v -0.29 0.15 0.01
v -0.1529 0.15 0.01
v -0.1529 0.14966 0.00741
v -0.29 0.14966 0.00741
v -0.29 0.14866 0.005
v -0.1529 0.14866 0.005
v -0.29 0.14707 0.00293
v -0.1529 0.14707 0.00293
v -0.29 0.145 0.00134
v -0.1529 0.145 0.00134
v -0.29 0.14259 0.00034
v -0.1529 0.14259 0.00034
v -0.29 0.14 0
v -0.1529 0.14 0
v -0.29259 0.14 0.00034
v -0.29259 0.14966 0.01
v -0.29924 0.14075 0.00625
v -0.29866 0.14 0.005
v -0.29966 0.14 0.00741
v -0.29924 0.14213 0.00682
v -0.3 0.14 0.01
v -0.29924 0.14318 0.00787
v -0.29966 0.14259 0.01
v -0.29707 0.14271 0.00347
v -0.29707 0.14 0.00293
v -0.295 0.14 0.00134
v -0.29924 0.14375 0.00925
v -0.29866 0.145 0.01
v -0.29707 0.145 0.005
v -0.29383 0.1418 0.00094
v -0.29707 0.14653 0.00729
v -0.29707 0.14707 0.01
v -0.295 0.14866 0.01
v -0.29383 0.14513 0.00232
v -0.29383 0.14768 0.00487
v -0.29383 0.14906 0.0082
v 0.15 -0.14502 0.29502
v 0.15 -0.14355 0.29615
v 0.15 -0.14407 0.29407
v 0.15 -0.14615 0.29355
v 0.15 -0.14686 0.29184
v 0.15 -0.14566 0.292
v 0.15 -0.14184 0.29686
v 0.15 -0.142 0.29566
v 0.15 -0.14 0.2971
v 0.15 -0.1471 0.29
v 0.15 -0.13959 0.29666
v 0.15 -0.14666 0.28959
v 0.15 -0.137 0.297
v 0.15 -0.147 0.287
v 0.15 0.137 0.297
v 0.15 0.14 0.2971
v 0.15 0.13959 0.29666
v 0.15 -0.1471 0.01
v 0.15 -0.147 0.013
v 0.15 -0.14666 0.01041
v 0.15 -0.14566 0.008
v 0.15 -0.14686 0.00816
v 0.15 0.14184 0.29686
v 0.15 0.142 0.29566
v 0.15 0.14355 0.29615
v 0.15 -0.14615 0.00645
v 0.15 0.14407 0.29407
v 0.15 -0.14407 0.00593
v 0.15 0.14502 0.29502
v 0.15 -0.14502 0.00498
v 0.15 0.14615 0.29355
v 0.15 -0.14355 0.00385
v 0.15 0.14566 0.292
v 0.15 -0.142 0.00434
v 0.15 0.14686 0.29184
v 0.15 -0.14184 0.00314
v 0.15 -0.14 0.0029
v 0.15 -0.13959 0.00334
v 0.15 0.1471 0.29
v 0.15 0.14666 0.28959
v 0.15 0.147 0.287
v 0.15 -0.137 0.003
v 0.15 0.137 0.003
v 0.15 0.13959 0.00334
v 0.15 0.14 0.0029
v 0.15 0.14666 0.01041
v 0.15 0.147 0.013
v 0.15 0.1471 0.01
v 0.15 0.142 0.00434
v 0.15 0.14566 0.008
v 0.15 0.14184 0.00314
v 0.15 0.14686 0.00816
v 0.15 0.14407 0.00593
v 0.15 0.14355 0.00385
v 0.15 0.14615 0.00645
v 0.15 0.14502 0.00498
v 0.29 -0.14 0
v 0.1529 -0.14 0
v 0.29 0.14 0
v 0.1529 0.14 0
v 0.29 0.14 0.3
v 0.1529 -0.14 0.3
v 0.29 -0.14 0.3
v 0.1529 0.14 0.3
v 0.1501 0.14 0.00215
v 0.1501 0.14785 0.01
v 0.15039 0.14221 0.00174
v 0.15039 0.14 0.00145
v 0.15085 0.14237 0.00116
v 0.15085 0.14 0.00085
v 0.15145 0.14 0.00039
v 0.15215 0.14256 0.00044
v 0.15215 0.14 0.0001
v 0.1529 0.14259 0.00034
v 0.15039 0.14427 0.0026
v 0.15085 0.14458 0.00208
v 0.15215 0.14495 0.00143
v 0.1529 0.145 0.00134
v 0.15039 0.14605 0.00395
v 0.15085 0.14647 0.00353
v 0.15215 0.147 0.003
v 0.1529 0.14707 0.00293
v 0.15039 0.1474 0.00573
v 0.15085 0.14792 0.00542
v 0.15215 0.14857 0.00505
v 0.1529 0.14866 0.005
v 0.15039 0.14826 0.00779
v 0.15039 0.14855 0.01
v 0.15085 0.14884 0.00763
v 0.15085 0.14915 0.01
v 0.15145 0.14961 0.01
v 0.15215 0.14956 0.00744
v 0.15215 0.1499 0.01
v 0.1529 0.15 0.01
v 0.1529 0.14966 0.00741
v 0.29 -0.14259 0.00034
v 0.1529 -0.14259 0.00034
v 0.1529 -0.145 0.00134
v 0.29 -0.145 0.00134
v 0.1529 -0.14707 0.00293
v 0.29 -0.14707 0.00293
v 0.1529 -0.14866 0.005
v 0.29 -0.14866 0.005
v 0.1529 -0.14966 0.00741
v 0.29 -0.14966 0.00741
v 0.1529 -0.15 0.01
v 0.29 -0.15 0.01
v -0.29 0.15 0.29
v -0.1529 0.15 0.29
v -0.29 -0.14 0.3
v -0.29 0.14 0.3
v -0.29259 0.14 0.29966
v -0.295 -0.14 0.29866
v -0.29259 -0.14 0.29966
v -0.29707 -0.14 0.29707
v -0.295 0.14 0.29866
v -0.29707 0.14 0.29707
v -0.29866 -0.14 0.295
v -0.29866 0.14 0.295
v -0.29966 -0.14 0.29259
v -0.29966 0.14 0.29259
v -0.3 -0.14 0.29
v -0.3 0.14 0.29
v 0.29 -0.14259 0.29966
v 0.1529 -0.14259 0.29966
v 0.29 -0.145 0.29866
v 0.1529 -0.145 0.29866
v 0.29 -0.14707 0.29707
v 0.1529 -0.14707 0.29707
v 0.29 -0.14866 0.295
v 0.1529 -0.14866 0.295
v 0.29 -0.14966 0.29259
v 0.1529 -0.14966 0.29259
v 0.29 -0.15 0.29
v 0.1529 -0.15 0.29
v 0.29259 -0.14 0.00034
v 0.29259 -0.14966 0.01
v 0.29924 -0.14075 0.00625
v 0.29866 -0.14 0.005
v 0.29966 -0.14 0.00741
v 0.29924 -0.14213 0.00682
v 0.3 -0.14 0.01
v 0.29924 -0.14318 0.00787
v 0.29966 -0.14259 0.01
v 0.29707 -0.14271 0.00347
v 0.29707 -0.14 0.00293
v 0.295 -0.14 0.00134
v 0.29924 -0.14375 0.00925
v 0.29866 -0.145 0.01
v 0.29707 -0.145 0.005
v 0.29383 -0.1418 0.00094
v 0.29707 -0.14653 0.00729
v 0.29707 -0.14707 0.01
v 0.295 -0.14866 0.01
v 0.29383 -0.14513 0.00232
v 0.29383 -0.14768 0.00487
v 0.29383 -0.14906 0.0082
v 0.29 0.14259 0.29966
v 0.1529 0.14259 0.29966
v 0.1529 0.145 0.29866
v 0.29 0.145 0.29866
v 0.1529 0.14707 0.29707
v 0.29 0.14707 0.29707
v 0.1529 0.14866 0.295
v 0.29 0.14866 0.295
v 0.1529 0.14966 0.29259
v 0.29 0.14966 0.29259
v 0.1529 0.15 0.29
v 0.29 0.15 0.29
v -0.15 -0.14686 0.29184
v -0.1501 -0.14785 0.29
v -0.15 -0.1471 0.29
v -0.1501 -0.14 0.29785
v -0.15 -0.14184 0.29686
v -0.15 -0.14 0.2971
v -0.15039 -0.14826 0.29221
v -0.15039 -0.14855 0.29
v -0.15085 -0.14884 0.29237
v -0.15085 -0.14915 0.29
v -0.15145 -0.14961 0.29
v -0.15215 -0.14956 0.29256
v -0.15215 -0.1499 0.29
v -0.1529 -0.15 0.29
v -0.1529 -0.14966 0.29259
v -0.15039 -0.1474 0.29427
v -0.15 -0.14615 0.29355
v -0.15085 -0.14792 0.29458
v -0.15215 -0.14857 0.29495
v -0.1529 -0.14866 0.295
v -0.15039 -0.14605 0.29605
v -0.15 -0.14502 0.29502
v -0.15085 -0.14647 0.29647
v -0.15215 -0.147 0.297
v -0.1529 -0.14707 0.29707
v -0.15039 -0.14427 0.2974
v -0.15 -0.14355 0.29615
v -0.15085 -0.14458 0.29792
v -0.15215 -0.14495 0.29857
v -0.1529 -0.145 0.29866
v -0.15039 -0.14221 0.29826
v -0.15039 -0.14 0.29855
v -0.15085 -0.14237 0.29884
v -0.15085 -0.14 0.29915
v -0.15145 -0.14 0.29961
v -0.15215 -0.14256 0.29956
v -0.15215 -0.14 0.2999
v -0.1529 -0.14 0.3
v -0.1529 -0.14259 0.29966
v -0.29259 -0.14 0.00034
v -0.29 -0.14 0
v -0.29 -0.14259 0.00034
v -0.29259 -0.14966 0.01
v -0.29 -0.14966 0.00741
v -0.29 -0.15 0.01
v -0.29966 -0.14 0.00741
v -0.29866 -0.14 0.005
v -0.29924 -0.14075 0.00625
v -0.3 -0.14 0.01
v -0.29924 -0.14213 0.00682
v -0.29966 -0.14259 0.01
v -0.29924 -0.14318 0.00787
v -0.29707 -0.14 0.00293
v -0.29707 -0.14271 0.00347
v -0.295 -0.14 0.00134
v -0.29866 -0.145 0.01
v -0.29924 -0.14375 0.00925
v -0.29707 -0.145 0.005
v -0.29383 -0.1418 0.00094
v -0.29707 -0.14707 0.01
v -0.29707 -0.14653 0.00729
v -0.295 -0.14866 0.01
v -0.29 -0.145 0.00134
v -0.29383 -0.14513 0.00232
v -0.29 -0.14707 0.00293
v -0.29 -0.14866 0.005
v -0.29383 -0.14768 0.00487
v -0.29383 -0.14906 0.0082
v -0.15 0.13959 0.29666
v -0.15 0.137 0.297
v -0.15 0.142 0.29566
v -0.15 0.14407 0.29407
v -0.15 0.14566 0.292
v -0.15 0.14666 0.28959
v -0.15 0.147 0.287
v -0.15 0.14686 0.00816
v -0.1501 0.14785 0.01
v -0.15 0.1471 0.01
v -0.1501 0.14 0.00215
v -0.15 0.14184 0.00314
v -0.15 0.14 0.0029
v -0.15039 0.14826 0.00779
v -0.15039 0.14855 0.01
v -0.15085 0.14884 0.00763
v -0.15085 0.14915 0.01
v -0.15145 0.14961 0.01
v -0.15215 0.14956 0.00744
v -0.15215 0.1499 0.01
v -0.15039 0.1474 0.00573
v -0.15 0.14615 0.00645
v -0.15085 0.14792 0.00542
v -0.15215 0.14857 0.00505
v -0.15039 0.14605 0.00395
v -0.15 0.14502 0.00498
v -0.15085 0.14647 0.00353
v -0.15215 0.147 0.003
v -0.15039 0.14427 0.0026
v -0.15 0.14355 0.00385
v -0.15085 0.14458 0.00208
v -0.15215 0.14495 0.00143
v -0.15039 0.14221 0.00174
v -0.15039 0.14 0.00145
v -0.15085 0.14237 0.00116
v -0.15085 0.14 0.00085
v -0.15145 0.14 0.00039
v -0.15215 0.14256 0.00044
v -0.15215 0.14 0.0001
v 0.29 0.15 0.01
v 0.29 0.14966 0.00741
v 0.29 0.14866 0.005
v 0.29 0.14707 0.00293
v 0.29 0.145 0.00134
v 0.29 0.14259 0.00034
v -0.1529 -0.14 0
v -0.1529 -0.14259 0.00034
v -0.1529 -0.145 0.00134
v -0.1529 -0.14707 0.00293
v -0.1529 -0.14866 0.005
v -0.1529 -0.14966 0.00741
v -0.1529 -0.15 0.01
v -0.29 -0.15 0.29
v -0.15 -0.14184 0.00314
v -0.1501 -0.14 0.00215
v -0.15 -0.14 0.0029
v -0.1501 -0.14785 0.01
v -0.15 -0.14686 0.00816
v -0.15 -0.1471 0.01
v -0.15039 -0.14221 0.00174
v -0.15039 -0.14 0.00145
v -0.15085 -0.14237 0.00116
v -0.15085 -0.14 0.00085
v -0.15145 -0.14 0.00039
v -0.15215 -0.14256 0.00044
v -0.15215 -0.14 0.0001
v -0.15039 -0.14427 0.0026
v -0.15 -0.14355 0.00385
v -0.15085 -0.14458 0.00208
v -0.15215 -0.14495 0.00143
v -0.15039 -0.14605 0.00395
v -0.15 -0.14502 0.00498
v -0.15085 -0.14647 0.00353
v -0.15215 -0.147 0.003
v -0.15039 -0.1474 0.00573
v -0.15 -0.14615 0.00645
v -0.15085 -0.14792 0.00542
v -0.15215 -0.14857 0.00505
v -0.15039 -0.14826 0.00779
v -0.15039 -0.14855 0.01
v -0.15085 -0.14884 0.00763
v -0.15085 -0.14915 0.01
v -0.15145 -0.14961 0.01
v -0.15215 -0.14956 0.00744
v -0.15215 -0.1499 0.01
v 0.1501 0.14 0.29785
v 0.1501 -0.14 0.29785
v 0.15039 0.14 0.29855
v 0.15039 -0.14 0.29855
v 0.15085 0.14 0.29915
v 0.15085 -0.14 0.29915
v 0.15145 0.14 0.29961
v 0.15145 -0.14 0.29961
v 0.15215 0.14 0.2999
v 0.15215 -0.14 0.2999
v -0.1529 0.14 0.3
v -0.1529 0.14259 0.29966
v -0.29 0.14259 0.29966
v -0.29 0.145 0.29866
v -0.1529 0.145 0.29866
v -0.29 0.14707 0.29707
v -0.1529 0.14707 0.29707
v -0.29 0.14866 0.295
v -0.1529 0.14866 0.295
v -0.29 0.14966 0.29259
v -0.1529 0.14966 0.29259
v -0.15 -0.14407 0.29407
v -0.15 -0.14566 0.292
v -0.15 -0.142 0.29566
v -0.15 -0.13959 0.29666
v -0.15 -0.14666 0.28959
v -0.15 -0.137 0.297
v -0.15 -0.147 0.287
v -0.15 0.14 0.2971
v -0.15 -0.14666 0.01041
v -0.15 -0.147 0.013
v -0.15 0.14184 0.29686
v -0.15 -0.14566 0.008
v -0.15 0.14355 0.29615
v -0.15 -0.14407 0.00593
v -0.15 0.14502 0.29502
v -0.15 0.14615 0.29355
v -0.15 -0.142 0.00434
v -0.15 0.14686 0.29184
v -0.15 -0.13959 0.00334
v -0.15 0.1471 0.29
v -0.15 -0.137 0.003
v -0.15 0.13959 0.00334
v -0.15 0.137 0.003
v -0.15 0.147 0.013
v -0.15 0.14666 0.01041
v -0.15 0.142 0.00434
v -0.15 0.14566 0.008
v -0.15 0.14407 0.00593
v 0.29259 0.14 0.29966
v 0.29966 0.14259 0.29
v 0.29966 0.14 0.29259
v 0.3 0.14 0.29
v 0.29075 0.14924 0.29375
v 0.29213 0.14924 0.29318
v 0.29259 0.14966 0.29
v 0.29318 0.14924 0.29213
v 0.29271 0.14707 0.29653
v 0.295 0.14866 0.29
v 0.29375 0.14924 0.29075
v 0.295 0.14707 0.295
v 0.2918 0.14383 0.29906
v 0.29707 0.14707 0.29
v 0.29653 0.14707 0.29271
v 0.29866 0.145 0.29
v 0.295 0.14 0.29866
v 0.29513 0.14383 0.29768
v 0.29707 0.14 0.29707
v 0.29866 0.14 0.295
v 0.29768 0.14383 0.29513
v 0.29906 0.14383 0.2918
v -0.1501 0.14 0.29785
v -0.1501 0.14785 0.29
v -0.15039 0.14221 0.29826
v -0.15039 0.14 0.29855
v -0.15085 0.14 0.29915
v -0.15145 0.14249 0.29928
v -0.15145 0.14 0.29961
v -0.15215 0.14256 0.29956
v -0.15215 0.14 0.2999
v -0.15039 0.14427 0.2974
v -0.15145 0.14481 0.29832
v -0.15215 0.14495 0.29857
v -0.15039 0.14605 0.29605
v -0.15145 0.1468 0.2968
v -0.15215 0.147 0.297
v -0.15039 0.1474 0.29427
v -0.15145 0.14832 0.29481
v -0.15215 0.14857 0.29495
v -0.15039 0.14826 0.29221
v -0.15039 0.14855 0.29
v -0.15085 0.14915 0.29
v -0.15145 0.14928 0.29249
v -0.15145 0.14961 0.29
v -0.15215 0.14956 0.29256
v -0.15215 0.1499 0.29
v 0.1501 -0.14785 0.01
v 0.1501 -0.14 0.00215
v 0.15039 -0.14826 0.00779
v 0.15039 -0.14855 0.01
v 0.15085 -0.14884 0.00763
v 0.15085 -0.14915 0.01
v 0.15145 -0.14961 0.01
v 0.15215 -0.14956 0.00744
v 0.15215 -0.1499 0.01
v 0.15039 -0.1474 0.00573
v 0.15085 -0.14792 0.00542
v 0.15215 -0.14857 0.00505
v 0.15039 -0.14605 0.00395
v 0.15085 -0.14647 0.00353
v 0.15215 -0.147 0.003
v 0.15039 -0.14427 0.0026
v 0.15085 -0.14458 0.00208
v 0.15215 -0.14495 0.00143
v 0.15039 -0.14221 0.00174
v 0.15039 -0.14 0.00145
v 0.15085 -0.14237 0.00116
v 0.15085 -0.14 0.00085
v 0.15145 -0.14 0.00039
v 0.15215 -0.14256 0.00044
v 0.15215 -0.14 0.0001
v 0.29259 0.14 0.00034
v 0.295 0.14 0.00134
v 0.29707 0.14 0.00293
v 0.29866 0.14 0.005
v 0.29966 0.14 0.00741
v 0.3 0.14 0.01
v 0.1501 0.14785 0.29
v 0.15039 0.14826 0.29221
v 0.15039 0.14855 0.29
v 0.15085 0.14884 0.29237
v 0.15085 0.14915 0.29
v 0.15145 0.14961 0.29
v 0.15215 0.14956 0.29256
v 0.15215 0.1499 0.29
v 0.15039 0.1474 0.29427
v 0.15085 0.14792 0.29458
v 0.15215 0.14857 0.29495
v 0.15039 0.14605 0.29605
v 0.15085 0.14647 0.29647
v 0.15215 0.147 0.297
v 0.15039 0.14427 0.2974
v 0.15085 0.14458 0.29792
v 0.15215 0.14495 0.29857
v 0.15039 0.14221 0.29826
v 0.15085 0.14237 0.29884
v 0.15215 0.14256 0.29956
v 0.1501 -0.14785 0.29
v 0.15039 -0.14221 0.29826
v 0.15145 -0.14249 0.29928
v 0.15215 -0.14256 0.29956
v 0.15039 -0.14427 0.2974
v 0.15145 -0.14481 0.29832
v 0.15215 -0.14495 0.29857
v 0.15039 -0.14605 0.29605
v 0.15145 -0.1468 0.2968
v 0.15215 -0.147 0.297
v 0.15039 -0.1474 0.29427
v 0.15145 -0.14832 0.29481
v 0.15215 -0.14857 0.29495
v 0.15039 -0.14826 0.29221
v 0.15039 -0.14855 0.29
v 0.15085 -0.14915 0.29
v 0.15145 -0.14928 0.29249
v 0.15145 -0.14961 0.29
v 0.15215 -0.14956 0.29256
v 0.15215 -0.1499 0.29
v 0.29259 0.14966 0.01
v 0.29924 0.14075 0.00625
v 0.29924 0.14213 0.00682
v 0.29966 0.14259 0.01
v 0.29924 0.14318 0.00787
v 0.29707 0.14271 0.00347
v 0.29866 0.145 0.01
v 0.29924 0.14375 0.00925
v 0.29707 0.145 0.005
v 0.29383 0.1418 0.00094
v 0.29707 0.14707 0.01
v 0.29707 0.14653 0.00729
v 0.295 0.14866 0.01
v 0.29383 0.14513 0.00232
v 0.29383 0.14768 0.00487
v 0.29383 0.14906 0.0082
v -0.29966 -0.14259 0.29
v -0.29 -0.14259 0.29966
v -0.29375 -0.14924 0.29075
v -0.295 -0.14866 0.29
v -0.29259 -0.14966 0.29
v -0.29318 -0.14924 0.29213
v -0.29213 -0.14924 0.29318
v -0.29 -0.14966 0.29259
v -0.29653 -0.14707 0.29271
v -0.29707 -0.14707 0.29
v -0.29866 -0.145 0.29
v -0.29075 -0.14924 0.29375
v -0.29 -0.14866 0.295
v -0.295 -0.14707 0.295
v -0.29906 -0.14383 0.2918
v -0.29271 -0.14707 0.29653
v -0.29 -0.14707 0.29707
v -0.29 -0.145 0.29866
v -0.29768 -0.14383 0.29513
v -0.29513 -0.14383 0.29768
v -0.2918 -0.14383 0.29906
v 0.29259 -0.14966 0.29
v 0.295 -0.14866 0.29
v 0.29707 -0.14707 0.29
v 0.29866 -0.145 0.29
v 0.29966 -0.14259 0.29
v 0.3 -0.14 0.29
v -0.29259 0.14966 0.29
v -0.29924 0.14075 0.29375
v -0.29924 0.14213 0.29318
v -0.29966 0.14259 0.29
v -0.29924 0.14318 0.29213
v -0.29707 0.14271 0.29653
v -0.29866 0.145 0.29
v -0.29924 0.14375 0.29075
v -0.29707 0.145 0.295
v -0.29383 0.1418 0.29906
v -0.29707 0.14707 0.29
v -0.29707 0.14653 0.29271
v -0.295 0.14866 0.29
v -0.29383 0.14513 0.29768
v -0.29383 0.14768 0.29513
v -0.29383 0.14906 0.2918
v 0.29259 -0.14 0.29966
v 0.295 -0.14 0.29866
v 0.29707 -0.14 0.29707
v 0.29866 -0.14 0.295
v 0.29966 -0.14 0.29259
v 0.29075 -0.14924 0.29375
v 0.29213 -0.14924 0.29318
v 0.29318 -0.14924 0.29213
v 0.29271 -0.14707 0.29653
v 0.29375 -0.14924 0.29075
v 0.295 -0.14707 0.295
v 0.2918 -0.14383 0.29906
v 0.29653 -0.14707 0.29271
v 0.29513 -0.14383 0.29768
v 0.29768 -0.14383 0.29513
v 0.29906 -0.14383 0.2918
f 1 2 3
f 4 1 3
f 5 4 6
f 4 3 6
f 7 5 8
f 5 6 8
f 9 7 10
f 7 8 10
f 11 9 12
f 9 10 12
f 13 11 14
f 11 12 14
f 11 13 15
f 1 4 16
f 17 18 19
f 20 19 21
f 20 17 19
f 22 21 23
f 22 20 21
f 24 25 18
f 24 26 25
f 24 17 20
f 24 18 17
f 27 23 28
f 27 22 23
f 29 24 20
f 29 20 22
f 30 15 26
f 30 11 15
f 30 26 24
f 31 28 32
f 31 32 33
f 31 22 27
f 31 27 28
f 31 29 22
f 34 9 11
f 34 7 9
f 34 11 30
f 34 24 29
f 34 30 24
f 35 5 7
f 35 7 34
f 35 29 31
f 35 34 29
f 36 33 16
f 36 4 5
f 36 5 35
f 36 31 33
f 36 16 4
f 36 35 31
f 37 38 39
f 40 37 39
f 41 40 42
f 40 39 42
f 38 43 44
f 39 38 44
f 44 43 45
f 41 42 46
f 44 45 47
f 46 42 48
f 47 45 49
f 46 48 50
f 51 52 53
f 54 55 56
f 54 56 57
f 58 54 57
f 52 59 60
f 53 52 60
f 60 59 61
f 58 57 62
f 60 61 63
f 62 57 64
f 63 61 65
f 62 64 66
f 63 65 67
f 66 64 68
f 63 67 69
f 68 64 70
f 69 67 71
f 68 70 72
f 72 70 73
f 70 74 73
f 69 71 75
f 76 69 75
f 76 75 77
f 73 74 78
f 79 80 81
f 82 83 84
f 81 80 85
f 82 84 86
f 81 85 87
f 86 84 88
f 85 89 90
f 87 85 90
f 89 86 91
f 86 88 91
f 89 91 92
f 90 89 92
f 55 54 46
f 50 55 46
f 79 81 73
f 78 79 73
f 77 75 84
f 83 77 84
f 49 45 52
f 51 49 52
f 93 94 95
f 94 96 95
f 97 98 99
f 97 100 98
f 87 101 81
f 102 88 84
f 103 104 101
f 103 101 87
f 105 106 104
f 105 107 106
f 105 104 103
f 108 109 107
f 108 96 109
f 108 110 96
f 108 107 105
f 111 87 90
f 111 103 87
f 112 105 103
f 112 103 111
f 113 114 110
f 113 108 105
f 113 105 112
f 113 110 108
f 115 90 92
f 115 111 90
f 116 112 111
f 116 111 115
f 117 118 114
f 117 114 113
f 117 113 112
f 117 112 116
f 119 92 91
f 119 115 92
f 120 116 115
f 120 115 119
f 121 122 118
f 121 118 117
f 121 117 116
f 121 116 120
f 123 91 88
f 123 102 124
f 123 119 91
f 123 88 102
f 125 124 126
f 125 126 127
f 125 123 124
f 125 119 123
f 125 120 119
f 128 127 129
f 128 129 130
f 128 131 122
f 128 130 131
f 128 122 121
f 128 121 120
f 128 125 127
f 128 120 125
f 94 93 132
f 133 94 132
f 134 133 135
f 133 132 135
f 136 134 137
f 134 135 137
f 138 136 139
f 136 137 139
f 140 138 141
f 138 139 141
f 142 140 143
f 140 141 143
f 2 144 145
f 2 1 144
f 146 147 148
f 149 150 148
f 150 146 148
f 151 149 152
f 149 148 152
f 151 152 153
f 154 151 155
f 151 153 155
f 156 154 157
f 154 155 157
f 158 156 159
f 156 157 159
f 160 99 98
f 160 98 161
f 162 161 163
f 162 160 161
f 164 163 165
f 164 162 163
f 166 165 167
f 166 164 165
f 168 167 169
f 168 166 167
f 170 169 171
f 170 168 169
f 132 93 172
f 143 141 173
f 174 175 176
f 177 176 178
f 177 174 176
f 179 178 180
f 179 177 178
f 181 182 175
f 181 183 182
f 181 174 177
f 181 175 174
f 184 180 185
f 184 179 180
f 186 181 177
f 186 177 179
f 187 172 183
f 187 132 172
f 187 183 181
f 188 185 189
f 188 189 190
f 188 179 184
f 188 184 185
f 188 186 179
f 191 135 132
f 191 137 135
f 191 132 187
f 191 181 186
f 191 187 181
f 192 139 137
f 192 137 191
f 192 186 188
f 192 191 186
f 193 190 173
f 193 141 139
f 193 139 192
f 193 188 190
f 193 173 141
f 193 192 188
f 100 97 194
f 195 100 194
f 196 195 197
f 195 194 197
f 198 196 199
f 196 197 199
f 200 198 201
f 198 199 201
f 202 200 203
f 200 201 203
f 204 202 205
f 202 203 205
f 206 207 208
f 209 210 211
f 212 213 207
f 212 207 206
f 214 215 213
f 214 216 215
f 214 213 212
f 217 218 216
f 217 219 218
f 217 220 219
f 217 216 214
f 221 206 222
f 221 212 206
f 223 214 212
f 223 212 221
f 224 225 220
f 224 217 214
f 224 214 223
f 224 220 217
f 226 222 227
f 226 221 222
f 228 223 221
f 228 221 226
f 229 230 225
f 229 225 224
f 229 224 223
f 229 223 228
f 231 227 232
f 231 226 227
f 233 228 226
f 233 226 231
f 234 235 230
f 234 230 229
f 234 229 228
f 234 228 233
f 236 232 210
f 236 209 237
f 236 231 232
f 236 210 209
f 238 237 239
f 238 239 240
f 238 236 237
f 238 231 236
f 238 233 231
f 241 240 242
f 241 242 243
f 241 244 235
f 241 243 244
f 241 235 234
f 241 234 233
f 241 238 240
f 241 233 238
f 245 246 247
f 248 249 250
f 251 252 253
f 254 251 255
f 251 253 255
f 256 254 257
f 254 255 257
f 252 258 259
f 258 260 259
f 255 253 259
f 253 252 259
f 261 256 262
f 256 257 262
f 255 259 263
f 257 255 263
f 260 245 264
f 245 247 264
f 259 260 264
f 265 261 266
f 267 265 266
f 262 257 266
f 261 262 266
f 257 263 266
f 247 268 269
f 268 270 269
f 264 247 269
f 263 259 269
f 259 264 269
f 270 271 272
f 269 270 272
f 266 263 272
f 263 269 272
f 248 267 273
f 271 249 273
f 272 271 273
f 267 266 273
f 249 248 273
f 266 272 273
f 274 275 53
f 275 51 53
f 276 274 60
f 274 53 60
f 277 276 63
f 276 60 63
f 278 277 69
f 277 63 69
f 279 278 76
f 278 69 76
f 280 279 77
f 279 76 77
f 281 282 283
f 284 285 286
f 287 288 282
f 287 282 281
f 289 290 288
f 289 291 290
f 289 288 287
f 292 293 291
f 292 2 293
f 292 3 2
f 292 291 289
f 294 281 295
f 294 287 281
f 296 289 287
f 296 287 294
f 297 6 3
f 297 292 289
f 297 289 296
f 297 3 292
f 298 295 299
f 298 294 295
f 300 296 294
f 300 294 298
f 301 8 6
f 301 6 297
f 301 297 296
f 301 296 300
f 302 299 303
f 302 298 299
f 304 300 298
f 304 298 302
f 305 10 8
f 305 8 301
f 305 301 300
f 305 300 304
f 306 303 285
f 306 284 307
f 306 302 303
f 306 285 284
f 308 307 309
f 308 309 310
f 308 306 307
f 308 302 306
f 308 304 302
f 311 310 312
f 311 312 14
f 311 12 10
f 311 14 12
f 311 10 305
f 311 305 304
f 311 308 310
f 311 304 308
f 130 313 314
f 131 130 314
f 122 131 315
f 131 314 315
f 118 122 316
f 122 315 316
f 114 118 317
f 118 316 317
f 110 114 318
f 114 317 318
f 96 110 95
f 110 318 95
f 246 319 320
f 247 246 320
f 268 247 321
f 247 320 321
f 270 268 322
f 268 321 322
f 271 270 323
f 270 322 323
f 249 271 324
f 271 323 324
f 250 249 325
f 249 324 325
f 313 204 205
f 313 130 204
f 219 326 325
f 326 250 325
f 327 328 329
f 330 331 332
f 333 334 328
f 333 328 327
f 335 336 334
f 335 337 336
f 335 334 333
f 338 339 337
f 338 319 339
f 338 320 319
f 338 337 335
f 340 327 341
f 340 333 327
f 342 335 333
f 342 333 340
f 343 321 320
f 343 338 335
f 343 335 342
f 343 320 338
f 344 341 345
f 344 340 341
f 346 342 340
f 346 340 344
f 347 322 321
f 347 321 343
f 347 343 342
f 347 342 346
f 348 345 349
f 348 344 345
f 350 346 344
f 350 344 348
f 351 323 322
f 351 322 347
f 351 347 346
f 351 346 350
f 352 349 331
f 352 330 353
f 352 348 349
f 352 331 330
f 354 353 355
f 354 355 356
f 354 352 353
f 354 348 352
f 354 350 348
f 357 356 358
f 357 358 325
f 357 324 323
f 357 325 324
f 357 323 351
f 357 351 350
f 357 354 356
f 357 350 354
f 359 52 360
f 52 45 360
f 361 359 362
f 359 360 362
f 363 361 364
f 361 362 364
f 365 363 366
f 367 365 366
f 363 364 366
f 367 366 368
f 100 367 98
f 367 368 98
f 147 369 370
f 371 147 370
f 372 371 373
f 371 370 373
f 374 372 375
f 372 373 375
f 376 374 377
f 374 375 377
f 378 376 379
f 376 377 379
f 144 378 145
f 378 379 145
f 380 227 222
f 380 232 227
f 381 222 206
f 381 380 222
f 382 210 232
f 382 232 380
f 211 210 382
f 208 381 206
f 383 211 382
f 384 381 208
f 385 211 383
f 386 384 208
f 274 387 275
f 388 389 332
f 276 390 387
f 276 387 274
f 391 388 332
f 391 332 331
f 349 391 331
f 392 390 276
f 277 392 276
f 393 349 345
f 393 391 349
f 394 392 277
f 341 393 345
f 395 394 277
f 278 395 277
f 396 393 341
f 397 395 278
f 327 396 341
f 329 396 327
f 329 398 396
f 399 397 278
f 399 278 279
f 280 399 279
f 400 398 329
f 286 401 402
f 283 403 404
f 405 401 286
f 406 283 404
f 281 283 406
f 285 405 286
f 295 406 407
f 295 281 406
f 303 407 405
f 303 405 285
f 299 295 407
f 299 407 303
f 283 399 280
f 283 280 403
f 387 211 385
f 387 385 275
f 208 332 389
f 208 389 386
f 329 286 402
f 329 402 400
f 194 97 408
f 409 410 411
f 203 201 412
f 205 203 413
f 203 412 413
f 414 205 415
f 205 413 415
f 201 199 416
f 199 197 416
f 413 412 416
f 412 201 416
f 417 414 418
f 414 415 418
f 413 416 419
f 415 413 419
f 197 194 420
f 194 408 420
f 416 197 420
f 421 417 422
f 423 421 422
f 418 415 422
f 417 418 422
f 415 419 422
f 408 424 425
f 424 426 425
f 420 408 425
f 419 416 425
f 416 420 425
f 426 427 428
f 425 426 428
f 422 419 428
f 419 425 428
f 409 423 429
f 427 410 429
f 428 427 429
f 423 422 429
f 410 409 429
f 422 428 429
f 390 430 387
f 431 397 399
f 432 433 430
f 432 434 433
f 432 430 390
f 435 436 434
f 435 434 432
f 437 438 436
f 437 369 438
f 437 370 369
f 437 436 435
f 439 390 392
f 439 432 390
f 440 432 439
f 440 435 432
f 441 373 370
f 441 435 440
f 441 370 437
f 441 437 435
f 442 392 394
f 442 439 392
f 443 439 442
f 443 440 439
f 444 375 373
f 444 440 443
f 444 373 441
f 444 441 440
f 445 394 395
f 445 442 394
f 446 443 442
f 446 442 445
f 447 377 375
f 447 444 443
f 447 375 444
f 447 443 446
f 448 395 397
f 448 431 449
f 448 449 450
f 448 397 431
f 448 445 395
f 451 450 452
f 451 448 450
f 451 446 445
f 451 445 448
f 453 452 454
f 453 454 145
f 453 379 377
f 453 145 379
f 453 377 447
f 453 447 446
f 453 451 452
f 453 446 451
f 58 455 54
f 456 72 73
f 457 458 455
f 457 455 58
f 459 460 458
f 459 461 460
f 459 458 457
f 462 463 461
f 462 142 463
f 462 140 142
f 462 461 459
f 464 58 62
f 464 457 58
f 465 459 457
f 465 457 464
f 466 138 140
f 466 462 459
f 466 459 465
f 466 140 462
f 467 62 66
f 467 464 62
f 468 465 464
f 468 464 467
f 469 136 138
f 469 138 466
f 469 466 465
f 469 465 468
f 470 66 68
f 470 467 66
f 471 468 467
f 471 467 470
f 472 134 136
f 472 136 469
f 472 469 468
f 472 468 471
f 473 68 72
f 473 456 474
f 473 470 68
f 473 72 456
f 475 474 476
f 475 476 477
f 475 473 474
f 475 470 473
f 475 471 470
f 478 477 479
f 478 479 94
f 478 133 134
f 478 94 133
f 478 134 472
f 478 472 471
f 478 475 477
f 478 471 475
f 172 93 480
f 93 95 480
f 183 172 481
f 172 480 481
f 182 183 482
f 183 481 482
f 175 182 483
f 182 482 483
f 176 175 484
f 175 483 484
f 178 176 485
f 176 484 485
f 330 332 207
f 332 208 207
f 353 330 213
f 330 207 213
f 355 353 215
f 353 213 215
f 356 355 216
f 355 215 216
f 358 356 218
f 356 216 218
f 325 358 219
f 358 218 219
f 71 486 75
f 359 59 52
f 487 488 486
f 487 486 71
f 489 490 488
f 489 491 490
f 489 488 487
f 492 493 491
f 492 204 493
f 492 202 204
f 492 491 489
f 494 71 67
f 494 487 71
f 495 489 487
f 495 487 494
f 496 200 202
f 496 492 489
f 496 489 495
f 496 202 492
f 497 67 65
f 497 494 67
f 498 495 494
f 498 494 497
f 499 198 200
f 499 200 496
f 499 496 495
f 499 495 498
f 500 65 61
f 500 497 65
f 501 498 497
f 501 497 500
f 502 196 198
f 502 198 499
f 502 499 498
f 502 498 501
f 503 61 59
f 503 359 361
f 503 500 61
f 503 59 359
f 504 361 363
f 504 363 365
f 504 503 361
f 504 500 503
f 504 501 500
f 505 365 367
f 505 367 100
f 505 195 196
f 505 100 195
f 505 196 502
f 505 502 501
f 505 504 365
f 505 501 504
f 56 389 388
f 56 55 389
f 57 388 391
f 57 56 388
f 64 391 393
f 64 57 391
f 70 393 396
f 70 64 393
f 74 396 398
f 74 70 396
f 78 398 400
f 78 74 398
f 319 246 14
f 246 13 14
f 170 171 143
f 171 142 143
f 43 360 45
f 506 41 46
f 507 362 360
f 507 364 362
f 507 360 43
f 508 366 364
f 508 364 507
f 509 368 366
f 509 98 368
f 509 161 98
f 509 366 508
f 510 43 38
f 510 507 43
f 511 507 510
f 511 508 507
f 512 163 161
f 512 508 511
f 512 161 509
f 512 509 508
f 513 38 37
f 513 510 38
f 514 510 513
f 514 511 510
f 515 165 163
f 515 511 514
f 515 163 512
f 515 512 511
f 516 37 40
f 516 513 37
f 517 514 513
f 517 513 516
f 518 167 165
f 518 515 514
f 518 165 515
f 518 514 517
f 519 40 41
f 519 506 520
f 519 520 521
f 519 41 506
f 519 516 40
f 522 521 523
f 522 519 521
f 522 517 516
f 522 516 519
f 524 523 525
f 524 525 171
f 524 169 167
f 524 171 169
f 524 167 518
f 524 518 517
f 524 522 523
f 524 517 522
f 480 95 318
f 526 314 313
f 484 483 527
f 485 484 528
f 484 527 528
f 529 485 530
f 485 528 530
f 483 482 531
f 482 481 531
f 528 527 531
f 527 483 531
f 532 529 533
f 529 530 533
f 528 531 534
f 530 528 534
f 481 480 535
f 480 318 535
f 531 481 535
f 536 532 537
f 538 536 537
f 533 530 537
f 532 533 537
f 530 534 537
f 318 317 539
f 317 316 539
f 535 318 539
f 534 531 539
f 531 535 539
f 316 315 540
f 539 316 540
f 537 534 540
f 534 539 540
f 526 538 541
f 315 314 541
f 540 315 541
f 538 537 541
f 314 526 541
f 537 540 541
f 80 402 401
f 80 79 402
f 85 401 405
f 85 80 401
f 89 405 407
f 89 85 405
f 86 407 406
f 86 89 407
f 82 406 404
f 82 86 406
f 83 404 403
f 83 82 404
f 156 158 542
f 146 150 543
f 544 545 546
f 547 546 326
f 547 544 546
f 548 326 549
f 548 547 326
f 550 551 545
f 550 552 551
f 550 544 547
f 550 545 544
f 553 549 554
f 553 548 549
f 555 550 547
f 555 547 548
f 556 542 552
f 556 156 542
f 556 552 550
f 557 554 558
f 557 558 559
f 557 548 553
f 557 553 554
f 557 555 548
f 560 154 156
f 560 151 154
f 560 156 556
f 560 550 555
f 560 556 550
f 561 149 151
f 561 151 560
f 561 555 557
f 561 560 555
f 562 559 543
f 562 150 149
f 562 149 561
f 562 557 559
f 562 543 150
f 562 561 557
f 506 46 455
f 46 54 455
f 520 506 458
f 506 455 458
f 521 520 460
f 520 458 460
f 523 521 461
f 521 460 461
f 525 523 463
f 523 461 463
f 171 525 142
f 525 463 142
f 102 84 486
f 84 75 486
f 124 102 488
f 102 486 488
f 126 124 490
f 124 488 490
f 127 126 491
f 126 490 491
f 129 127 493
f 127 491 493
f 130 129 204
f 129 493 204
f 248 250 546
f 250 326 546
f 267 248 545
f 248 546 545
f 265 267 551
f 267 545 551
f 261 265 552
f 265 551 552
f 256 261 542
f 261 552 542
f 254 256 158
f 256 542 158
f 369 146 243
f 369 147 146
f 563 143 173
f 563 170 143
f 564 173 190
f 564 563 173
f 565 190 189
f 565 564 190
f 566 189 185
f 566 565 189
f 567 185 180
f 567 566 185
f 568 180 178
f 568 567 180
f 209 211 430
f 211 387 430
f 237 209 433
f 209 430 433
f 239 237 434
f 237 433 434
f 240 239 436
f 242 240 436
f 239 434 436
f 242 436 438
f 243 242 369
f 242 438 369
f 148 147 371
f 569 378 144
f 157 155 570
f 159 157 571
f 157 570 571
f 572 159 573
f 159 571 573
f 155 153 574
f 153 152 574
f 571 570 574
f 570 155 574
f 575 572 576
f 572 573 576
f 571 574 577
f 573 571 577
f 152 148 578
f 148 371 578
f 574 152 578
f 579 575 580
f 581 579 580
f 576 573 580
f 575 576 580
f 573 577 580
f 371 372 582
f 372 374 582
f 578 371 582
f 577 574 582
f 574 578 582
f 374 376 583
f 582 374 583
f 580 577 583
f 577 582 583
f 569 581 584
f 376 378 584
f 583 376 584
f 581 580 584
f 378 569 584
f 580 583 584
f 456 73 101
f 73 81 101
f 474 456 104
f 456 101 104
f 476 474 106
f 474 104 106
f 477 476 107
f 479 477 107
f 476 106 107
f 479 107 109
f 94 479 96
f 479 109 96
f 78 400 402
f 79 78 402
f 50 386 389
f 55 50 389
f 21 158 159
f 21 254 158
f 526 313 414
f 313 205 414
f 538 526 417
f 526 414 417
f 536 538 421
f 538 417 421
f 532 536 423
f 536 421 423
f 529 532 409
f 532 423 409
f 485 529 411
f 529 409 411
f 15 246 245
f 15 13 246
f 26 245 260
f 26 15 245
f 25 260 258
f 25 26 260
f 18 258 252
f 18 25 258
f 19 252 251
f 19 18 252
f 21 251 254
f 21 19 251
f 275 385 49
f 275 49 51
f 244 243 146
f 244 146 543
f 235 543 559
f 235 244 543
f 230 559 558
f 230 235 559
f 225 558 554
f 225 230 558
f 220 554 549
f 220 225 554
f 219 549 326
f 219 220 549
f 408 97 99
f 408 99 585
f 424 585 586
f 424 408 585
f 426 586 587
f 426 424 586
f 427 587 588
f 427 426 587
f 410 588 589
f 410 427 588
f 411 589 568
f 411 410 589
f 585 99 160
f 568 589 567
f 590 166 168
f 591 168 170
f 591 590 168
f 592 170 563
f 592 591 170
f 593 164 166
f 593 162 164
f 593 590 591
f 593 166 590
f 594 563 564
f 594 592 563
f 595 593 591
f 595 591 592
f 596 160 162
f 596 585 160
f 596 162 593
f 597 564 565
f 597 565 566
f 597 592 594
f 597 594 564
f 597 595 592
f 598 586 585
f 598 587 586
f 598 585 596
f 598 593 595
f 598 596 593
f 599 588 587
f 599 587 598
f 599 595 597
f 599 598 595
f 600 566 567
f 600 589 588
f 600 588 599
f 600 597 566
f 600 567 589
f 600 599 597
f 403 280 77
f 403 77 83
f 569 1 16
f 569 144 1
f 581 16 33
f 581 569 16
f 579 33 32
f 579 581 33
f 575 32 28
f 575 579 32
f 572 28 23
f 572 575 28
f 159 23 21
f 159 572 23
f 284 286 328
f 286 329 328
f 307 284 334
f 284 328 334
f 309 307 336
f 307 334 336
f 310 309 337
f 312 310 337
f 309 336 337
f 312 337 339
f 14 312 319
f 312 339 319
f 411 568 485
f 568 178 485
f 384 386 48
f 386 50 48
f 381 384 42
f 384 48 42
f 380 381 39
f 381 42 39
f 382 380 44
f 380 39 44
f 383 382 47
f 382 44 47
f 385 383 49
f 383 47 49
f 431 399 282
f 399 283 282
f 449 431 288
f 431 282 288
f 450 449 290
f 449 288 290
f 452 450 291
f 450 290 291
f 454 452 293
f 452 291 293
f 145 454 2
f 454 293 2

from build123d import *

# Parameters (mm, degrees)
SKETCH1_W                           = 0.6
SKETCH1_H                           = 0.3
ALL_BODY_DEPTH                      = 0.3
CUT_OUT_THE_BODY_FOR_PIN_DEPTH      = 0.15
CUT_OUT_THE_BODY_FOR_PIN_DEPTH_BACK = 0.15
SKETCH2_OUTSIDE_W                   = 2.446
SKETCH2_OUTSIDE_H                   = 2.446
SKETCH2_OUTSIDE_W_2                 = 0.294
SKETCH2_OUTSIDE_H_2                 = 0.294
BODY_FILLET_R                       = 0.01
PIN_FILLET_A_R                      = 0.01
PIN_FILLET_B_R                      = 0.003


with BuildPart() as part:
    # Sketch1 → All body (new body)
    with BuildSketch(Plane.XY):
        Rectangle(SKETCH1_W, SKETCH1_H)
    extrude(amount=ALL_BODY_DEPTH)

    # Sketch2 outside → Cut out the body for pin (cut, two sides: drawn at the far end of the back side and taken through both)
    with BuildSketch(Plane(origin=(0, 0, 0), x_dir=(0, 0, -1), z_dir=(1, 0, 0)).offset(-CUT_OUT_THE_BODY_FOR_PIN_DEPTH_BACK)):
        with Locations((-0.15, 0)):
            Rectangle(SKETCH2_OUTSIDE_W, SKETCH2_OUTSIDE_H)
        with Locations((-0.15, 0)):
            Rectangle(SKETCH2_OUTSIDE_W_2, SKETCH2_OUTSIDE_H_2, mode=Mode.SUBTRACT)
    extrude(amount=CUT_OUT_THE_BODY_FOR_PIN_DEPTH + CUT_OUT_THE_BODY_FOR_PIN_DEPTH_BACK, mode=Mode.SUBTRACT)

    # Body fillet
    body_fillet_edges = [part.edges().sort_by_distance(p)[0] for p in [
        (0, 0.147, 0.003),
        (0, 0.147, 0.297),
        (0, -0.147, 0.297),
        (0, -0.147, 0.003),
    ]]
    fillet(body_fillet_edges, radius=BODY_FILLET_R)

    # Pin fillet a
    pin_fillet_a_edges = [part.edges().sort_by_distance(p)[0] for p in [
        (0.3, 0, 0.3),
        (-0.225, 0.15, 0),
        (0.225, -0.15, 0),
        (0.225, -0.15, 0.3),
        (-0.225, 0.15, 0.3),
        (0.225, 0.15, 0.3),
        (-0.3, 0, 0.3),
        (0.225, 0.15, 0),
        (0.3, 0, 0),
        (-0.225, -0.15, 0),
        (-0.3, 0, 0),
        (-0.3, 0.15, 0.15),
        (0.3, 0.15, 0.15),
        (0.3, -0.15, 0.15),
        (-0.3, -0.15, 0.15),
        (-0.225, -0.15, 0.3),
    ]]
    fillet(pin_fillet_a_edges, radius=PIN_FILLET_A_R)

    # Pin fillet b
    pin_fillet_b_edges = [part.edges().sort_by_distance(p)[0] for p in [
        (0.15, -0.15, 0.15),
        (0.15, 0, 0.3),
        (0.15, 0.15, 0.15),
        (0.15, 0, 0),
        (-0.15, 0.15, 0.15),
        (-0.15, 0, 0.3),
        (-0.15, -0.15, 0.15),
        (-0.15, 0, 0),
        (0.15, 0.147071068, 0.002928932),
        (0.15, -0.147071068, 0.002928932),
        (0.15, -0.147071068, 0.297071068),
        (0.15, 0.147071068, 0.297071068),
        (-0.15, -0.147071068, 0.297071068),
        (-0.15, 0.147071068, 0.297071068),
        (-0.15, -0.147071068, 0.002928932),
        (-0.15, 0.147071068, 0.002928932),
    ]]
    fillet(pin_fillet_b_edges, radius=PIN_FILLET_B_R - 0.0001)  # a hair under: the kernel refuses the full size


solid = part.part
